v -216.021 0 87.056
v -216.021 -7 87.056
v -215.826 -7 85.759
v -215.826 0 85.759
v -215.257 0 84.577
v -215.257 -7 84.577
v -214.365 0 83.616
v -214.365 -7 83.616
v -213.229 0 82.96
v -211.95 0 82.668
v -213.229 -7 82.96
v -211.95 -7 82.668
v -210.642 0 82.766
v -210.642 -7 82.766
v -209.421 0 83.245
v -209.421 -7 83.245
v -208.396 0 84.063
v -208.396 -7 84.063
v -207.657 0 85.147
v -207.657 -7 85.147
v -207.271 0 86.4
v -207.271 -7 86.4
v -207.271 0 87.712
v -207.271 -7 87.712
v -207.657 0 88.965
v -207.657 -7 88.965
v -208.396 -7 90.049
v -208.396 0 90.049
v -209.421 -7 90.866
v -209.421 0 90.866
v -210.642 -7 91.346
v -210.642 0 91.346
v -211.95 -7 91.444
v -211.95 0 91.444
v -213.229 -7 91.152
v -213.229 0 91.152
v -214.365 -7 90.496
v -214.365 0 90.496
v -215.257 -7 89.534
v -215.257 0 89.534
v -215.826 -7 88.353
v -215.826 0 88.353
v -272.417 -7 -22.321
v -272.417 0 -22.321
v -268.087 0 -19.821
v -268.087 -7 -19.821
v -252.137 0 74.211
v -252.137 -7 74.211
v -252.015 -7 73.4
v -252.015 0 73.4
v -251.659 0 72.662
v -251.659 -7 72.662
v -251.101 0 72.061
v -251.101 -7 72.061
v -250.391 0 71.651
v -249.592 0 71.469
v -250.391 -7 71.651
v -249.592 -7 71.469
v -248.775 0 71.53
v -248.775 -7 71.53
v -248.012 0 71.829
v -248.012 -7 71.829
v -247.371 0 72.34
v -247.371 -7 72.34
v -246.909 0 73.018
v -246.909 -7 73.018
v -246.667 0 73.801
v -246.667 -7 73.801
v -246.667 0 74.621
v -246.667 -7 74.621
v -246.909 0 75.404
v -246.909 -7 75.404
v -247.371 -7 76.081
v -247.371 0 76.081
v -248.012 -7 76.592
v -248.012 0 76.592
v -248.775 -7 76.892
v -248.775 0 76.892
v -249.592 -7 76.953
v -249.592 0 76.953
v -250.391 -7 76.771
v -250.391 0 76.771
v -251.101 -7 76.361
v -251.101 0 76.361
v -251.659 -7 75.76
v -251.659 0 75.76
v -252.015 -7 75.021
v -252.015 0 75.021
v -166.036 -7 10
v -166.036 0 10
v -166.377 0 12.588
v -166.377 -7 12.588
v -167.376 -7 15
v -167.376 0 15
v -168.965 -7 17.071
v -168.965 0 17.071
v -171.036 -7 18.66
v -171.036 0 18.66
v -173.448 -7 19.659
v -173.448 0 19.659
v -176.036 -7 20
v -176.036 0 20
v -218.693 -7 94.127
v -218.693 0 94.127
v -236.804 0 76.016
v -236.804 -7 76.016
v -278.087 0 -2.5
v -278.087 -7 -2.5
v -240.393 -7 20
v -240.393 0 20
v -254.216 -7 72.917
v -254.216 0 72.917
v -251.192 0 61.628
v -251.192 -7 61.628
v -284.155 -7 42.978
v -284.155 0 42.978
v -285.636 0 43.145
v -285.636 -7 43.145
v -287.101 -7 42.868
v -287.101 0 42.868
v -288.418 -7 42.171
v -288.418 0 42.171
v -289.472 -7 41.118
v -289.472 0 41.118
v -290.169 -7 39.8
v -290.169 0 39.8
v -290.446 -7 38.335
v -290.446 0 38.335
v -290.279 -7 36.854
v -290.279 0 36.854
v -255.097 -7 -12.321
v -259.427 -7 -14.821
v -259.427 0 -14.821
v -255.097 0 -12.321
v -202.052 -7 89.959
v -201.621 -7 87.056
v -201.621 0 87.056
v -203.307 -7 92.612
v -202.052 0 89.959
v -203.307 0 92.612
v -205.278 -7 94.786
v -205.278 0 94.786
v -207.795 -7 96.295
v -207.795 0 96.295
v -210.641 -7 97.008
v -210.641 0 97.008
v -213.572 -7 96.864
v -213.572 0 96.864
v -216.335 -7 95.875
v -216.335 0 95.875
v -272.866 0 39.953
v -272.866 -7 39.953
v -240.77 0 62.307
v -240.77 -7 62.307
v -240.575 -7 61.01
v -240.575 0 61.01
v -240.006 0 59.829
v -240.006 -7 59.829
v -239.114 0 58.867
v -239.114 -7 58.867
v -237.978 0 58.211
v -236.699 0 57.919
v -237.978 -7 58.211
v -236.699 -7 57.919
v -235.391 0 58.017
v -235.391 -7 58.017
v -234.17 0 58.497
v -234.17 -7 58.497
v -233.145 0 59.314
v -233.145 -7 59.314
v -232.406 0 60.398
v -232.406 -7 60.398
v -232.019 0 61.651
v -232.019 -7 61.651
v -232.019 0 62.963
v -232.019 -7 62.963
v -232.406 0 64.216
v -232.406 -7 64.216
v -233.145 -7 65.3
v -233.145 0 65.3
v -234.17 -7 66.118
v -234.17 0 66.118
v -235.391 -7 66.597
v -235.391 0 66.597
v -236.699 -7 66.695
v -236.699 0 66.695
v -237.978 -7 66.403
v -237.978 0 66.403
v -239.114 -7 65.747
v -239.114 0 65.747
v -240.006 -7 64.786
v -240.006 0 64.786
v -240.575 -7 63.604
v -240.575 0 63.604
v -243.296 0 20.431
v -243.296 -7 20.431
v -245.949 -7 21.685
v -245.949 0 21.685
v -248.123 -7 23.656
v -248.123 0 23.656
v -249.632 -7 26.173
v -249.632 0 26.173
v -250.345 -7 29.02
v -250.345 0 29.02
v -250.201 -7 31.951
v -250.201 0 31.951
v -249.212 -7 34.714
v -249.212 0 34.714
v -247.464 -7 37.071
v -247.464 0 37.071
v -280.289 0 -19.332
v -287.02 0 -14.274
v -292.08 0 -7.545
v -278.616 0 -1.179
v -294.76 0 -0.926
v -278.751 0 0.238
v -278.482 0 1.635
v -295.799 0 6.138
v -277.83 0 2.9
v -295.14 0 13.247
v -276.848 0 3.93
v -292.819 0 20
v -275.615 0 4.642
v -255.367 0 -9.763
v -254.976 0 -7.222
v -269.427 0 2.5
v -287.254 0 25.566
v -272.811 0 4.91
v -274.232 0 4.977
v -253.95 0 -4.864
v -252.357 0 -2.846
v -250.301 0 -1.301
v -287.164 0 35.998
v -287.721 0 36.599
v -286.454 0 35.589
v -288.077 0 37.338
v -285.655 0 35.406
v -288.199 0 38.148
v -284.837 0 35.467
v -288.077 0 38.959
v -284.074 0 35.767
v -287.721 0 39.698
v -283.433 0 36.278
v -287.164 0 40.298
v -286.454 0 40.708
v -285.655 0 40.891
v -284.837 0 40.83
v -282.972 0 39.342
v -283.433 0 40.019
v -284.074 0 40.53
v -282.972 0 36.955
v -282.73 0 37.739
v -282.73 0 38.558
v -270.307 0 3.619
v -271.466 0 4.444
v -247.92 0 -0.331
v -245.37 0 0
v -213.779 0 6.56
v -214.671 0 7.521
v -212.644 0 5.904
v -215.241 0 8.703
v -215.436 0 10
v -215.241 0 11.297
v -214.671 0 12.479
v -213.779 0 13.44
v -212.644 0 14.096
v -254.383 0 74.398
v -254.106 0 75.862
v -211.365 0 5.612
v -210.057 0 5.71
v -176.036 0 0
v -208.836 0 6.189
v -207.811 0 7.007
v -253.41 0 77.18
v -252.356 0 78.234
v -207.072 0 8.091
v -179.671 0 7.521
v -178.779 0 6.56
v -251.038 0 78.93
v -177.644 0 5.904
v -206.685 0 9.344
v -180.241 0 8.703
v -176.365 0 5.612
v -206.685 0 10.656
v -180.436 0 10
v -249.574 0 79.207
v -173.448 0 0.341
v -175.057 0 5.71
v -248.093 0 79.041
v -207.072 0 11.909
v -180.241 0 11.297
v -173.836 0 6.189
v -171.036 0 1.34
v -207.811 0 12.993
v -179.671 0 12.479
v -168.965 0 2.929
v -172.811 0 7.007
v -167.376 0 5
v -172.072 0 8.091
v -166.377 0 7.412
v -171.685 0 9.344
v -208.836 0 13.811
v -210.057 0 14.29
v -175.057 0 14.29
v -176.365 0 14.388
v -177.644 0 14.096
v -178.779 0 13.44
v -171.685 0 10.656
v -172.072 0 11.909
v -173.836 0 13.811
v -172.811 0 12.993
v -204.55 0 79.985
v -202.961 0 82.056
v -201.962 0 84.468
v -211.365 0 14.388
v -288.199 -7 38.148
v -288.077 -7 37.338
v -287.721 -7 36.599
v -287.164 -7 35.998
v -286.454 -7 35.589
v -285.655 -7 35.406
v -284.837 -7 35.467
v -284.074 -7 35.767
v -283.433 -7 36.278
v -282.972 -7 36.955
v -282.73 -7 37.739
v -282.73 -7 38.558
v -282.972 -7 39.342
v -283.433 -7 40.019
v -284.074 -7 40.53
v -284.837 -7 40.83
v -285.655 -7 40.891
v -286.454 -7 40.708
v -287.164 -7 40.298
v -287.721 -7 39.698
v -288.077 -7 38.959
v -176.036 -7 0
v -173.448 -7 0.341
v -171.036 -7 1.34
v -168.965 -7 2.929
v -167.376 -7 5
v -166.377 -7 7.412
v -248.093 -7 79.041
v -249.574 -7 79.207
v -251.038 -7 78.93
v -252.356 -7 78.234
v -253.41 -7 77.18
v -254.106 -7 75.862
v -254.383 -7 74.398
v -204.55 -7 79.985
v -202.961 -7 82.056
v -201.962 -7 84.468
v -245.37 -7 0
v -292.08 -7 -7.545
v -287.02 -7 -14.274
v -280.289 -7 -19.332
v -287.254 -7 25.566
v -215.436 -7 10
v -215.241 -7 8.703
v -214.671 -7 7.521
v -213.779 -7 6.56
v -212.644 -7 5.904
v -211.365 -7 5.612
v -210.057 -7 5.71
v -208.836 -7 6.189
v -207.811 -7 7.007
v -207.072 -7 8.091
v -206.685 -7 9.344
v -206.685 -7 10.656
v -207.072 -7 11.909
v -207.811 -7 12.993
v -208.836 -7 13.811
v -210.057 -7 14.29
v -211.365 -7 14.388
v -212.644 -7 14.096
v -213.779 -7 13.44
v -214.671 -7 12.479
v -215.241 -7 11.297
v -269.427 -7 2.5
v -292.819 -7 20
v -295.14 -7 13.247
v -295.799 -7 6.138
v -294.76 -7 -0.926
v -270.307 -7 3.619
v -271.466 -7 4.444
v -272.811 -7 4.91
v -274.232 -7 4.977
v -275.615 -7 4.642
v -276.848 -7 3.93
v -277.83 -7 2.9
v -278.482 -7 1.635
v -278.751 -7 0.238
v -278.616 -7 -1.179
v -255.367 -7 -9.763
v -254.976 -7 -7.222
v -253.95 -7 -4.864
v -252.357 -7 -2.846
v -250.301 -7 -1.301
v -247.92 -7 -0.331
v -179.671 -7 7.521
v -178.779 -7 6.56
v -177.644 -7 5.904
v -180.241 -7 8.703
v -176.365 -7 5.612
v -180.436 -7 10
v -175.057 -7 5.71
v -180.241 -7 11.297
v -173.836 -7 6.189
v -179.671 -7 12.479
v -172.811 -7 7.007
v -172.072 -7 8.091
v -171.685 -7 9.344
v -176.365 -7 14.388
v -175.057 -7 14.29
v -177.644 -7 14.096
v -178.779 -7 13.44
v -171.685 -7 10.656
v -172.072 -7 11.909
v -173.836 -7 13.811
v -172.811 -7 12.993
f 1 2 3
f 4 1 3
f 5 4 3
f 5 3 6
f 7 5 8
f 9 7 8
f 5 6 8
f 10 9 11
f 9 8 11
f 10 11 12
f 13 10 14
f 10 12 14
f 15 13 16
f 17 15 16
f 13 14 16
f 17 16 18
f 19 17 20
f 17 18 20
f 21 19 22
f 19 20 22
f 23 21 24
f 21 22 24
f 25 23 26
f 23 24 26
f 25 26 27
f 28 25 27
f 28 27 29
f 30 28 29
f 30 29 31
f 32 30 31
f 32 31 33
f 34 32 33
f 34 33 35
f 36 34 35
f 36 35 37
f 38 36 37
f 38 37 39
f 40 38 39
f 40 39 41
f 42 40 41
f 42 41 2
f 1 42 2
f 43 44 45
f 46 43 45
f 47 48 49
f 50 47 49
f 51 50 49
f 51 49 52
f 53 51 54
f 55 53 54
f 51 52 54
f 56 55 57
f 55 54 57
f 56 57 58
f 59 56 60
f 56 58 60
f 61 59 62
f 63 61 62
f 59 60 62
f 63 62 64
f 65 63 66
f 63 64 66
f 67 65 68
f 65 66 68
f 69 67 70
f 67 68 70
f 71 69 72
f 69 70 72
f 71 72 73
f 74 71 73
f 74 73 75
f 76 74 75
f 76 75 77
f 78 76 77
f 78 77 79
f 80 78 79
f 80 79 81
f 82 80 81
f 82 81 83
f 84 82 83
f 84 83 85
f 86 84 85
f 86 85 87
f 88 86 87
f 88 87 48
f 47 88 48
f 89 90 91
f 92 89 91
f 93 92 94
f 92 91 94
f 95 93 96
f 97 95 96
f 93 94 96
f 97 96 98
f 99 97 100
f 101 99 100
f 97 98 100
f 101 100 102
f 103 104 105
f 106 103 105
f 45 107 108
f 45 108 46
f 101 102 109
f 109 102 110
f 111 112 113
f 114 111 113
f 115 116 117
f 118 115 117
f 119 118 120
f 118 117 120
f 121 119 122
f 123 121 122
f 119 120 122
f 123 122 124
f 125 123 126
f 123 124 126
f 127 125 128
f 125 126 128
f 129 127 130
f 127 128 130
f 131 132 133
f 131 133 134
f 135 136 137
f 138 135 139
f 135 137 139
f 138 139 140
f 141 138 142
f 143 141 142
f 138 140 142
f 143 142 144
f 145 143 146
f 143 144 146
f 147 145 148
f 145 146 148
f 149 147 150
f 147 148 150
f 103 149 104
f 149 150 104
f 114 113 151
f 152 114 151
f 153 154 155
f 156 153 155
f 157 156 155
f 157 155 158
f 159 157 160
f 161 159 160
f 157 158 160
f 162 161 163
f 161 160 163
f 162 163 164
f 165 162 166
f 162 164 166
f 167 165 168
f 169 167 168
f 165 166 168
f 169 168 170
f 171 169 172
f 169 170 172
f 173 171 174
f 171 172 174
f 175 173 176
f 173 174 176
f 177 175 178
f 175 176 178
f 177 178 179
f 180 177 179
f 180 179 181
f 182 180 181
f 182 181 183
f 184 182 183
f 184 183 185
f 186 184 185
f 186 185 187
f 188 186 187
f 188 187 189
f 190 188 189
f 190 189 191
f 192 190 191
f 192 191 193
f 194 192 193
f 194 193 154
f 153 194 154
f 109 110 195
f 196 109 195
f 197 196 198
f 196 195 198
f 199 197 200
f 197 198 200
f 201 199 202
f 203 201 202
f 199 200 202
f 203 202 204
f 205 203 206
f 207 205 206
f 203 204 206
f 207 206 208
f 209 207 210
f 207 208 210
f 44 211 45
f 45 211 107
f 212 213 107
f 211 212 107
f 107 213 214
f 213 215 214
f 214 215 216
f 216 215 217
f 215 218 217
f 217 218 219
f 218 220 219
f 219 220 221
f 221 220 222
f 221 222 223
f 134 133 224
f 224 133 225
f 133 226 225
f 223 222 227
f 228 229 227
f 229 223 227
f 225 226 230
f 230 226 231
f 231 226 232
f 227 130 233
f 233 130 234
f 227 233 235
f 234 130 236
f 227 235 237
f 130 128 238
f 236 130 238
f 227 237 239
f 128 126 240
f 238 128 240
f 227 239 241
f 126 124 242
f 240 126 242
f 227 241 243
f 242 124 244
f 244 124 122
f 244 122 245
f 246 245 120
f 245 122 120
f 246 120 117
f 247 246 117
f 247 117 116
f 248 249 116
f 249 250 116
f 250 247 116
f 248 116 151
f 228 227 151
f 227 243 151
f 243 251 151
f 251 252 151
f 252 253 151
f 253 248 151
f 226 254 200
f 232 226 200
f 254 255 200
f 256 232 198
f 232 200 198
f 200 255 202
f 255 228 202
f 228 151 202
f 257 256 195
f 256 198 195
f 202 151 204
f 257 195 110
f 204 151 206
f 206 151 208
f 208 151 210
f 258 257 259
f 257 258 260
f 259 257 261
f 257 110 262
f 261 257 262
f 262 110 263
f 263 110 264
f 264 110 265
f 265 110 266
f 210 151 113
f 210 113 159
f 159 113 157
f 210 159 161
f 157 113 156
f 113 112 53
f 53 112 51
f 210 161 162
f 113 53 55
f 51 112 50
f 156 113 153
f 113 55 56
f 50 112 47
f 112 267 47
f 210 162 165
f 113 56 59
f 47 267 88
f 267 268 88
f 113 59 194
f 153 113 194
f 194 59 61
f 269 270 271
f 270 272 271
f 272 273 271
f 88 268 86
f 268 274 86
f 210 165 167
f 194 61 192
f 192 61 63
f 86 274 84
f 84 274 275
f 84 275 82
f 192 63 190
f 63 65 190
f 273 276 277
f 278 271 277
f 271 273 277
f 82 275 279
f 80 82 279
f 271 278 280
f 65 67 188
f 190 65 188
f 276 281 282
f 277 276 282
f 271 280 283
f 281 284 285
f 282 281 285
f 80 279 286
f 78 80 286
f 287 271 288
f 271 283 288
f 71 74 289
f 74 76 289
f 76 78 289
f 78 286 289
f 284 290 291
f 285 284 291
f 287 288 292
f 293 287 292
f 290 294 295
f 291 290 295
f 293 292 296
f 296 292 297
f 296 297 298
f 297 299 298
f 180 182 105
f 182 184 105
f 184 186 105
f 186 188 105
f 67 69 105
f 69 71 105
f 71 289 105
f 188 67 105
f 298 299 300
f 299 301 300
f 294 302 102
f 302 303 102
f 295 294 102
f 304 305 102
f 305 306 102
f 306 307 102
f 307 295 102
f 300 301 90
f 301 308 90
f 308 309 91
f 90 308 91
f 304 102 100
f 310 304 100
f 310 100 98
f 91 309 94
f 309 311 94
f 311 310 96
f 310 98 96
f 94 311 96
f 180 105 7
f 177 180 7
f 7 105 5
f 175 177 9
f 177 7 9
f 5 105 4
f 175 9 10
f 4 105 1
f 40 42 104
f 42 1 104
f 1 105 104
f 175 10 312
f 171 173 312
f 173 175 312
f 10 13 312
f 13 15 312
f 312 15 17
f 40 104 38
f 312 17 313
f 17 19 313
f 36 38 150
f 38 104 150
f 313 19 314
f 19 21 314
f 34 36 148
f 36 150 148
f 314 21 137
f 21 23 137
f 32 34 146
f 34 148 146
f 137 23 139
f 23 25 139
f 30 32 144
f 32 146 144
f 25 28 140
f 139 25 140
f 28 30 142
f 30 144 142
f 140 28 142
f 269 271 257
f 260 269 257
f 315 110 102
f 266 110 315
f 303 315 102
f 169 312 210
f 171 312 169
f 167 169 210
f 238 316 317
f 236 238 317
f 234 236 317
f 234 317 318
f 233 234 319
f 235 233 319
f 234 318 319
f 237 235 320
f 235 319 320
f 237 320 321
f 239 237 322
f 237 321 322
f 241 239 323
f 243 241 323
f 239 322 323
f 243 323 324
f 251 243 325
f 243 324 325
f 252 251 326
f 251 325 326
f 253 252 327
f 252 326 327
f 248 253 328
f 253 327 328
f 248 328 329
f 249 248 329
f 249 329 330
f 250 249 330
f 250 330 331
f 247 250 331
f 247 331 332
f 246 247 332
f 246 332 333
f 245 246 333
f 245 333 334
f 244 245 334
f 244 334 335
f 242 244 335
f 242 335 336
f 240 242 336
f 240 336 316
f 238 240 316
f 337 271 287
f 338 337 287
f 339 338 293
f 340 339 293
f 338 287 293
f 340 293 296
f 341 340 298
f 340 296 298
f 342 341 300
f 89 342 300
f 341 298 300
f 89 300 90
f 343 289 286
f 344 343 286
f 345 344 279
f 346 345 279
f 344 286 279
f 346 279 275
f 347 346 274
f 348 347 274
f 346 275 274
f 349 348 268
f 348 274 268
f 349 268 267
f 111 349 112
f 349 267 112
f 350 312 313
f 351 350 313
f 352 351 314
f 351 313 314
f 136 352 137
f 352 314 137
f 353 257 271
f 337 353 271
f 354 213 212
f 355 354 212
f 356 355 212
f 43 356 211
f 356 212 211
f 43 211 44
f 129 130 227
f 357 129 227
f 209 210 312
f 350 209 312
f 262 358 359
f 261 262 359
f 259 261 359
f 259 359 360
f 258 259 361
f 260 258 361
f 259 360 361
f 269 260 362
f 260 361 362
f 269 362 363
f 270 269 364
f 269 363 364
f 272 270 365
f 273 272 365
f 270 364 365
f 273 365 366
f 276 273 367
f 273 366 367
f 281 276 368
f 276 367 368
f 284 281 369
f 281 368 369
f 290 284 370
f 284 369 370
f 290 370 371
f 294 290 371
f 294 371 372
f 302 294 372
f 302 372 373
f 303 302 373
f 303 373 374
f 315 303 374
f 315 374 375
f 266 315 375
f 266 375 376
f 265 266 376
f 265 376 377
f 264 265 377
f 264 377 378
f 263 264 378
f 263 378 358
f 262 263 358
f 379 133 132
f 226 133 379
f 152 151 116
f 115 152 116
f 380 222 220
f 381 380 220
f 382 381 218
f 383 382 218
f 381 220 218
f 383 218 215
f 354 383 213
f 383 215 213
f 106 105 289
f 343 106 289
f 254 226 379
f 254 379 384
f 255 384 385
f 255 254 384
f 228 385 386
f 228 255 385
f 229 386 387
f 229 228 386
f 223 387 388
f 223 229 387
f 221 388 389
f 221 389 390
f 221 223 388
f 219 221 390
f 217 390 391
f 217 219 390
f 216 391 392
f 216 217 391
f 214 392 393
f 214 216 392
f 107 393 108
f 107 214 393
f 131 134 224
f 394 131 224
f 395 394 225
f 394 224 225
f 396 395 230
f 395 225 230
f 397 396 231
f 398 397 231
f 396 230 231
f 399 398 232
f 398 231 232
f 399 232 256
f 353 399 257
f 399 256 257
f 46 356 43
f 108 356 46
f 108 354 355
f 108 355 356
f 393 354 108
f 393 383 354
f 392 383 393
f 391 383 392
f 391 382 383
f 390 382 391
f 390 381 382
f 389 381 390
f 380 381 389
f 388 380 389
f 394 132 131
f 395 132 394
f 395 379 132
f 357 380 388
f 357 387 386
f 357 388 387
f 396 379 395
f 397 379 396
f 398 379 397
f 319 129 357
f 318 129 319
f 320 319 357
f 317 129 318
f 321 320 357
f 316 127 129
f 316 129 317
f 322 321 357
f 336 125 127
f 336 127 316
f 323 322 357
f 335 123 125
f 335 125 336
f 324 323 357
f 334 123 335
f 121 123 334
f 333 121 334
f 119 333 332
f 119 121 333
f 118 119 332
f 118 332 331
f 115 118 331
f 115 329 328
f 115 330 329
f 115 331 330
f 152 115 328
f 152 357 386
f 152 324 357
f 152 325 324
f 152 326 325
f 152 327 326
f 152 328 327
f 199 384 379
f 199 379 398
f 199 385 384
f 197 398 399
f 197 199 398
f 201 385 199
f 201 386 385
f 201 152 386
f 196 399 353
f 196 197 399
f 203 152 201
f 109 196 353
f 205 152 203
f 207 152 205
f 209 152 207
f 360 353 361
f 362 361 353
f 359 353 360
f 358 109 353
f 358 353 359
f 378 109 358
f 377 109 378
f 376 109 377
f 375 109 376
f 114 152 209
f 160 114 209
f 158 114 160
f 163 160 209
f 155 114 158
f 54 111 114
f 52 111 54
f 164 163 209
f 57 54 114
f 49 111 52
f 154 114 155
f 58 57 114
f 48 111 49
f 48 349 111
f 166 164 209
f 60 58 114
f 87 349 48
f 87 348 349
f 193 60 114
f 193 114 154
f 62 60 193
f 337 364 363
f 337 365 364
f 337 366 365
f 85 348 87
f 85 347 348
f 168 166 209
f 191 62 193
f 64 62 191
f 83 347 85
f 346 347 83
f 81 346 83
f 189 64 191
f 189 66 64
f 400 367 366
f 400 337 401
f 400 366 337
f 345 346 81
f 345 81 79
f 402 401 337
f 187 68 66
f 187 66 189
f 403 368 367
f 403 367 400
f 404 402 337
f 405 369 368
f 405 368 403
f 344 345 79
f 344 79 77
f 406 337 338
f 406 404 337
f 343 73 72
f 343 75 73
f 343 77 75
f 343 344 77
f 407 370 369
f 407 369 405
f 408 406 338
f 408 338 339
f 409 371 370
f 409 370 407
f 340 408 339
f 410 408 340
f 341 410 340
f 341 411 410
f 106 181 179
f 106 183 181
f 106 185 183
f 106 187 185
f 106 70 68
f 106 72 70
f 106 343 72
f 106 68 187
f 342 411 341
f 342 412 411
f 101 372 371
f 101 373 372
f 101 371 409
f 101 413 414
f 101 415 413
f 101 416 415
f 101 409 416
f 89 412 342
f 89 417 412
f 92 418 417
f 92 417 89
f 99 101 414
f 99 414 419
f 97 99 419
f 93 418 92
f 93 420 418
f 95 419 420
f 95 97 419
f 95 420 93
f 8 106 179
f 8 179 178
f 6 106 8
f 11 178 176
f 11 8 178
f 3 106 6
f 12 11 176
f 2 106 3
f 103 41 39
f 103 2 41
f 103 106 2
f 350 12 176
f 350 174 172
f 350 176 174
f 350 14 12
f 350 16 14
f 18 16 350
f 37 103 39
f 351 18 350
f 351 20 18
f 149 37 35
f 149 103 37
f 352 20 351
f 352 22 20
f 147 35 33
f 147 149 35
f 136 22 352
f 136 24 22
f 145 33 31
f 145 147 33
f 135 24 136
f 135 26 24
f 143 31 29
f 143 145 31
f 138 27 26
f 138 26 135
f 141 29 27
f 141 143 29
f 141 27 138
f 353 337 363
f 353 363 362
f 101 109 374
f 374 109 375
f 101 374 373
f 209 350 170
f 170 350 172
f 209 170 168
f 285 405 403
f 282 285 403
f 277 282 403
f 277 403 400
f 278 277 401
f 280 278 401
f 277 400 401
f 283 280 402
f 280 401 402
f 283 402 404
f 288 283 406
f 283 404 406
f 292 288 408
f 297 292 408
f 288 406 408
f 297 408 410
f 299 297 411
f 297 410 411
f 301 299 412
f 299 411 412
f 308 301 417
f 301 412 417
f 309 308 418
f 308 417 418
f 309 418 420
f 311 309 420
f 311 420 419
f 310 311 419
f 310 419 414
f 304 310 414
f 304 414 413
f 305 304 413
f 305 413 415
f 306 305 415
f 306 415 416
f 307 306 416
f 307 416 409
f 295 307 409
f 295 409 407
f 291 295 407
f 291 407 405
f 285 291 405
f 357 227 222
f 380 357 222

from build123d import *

# Parameters (mm, degrees)
F2_DEPTH = 7
F3_DEPTH = 7
F4_D     = 5.5
F5_D     = 8.8


with BuildPart() as f2:
    # F1 (on Front) → F2 (new body)
    with BuildSketch(Plane.XZ):
        with BuildLine():
            ThreePointArc((-176.0360002518, 0), (-168.9649324399, 2.9289321881), (-166.0360002518, 10))
            ThreePointArc((-166.0360002518, 10), (-168.9649324399, 17.0710678119), (-176.0360002518, 20))
            ThreePointArc((-176.0360002518, 20), (-186.0360002518, 10), (-176.0360002518, 0))
        make_face()
        with BuildLine():
            Line((-264.5352196047, 20), (-240.393083981, 20))
            ThreePointArc((-240.393083981, 20), (-249.6318793158, 26.1731656999), (-247.4641517568, 37.0710678479))
            Line((-247.4641517568, 37.0710678479), (-264.5352196047, 20))
        make_face()
        with BuildLine():
            Line((-272.4173313033, -22.3205080757), (-255.0968232276, -12.3205080757))
            ThreePointArc((-255.0968232276, -12.3205080757), (-261.1688868565, -7.6612498015), (-268.757077341, -8.6602540815))
            ThreePointArc((-268.757077341, -8.6602540815), (-273.4163355396, -14.7323176668), (-272.4173313033, -22.3205080757))
        make_face()
        with BuildLine():
            Line((-255.0968232276, -12.3205080757), (-262.2100718816, 0))
            Line((-262.2100718816, 0), (-263.7570772654, 0))
            ThreePointArc((-263.7570772654, 0), (-265.0968232494, -5.0000000378), (-268.757077341, -8.6602540815))
            ThreePointArc((-268.757077341, -8.6602540815), (-261.1688868565, -7.6612498015), (-255.0968232276, -12.3205080757))
        make_face()
        with BuildLine():
            ThreePointArc((-272.4173313033, -22.3205080757), (-273.4163355396, -14.7323176668), (-268.757077341, -8.6602540815))
            ThreePointArc((-268.757077341, -8.6602540815), (-276.3452678591, -9.6592582247), (-282.4173314074, -4.9999998197))
            Line((-282.4173314074, -4.9999998197), (-272.4173313033, -22.3205080757))
        make_face()
        with BuildLine():
            ThreePointArc((-265.0968232276, 5), (-269.1126993205, 8.856057447), (-274.5681672284, 9.9670523763))
            Line((-274.5681672284, 9.9670523763), (-283.7241296417, 0.811089963))
            ThreePointArc((-283.7241296417, 0.811089963), (-283.5134253602, -2.1940081707), (-282.4173314074, -4.9999998197))
            ThreePointArc((-282.4173314074, -4.9999998197), (-276.3452678591, -9.6592582247), (-268.757077341, -8.6602540815))
            ThreePointArc((-268.757077341, -8.6602540815), (-265.0968232494, -5.0000000378), (-263.7570772654, 0))
            ThreePointArc((-263.7570772654, 0), (-264.0978190025, 2.588190451), (-265.0968232276, 5))
        make_face()
        with BuildLine():
            Line((-263.7570772654, 0), (-262.2100718816, 0))
            Line((-262.2100718816, 0), (-265.0968232276, 5))
            ThreePointArc((-265.0968232276, 5), (-264.0978190025, 2.588190451), (-263.7570772654, 0))
        make_face()
        with BuildLine():
            ThreePointArc((-176.0360002518, 0), (-186.0360002518, 10), (-176.0360002518, 20))
            Line((-176.0360002518, 20), (-240.393083981, 20))
            Line((-240.393083981, 20), (-264.5352196047, 20))
            Line((-264.5352196047, 20), (-274.5681672284, 9.9670523763))
            ThreePointArc((-274.5681672284, 9.9670523763), (-269.1126993205, 8.856057447), (-265.0968232276, 5))
            Line((-265.0968232276, 5), (-262.2100718816, 0))
            Line((-262.2100718816, 0), (-245.3697865632, 0))
            Line((-245.3697865632, 0), (-176.0360002518, 0))
        make_face()
        with BuildLine():
            Line((-283.7241296417, 0.811089963), (-274.5681672284, 9.9670523763))
            ThreePointArc((-274.5681672284, 9.9670523763), (-280.8281450773, 7.0710678119), (-283.7241296417, 0.811089963))
        make_face()
        with BuildLine():
            ThreePointArc((-282.4173314074, -4.9999998197), (-283.5134253602, -2.1940081707), (-283.7241296417, 0.811089963))
            Line((-283.7241296417, 0.811089963), (-285.0226592429, -0.4874396382))
            Line((-285.0226592429, -0.4874396382), (-282.4173314074, -4.9999998197))
        make_face()
        with BuildLine():
            Line((-274.5681672284, 9.9670523763), (-264.5352196047, 20))
            Line((-264.5352196047, 20), (-292.8194908522, 20))
            ThreePointArc((-292.8194908522, 20), (-295.7992302368, 6.1376963428), (-292.0799732137, -7.544753609))
            Line((-292.0799732137, -7.544753609), (-285.0226592429, -0.4874396382))
            Line((-285.0226592429, -0.4874396382), (-283.7241296417, 0.811089963))
            ThreePointArc((-283.7241296417, 0.811089963), (-280.8281450773, 7.0710678119), (-274.5681672284, 9.9670523763))
        make_face()
        with BuildLine():
            ThreePointArc((-292.0799732137, -7.544753609), (-283.8324896653, -17.0403017463), (-272.4173313033, -22.3205080757))
            Line((-272.4173313033, -22.3205080757), (-282.4173314074, -4.9999998197))
            Line((-282.4173314074, -4.9999998197), (-285.0226592429, -0.4874396382))
            Line((-285.0226592429, -0.4874396382), (-292.0799732137, -7.544753609))
        make_face()
        with BuildLine():
            Line((-292.8194908522, 20), (-264.5352196047, 20))
            Line((-264.5352196047, 20), (-247.4641517568, 37.0710678479))
            Line((-247.4641517568, 37.0710678479), (-204.550425378, 79.9847942268))
            ThreePointArc((-204.550425378, 79.9847942268), (-218.6925610017, 79.9847942268), (-218.6925610017, 94.1269298505))
            Line((-218.6925610017, 94.1269298505), (-236.8037936181, 76.015697234))
            Line((-236.8037936181, 76.015697234), (-251.1915228084, 61.6279680438))
            Line((-251.1915228084, 61.6279680438), (-272.8662394587, 39.9532513935))
            Line((-272.8662394587, 39.9532513935), (-287.2539686489, 25.5655222033))
            Line((-287.2539686489, 25.5655222033), (-292.8194908522, 20))
        make_face()
        with BuildLine():
            Line((-290.2788043549, 36.8543627425), (-287.2539686489, 25.5655222033))
            Line((-287.2539686489, 25.5655222033), (-272.8662394587, 39.9532513935))
            Line((-272.8662394587, 39.9532513935), (-284.1550799979, 42.9780870995))
            ThreePointArc((-284.1550799979, 42.9780870995), (-281.482408522, 41.1922651131), (-280.4491752234, 38.1484579681))
            ThreePointArc((-280.4491752234, 38.1484579681), (-284.7965442623, 33.1912336612), (-290.2788043549, 36.8543627425))
        make_face()
        with BuildLine():
            ThreePointArc((-284.1550799979, 42.9780870995), (-288.9847091293, 41.683991874), (-290.2788043549, 36.8543627425))
            ThreePointArc((-290.2788043549, 36.8543627425), (-284.7965442623, 33.1912336612), (-280.4491752234, 38.1484579681))
            ThreePointArc((-280.4491752234, 38.1484579681), (-281.482408522, 41.1922651131), (-284.1550799979, 42.9780870995))
        make_face()
        with BuildLine():
            Line((-251.1915228084, 61.6279680438), (-236.8037936181, 76.015697234))
            Line((-236.8037936181, 76.015697234), (-248.0926341574, 79.04053294))
            ThreePointArc((-248.0926341574, 79.04053294), (-245.4199626814, 77.2547109536), (-244.3867293829, 74.2109038086))
            ThreePointArc((-244.3867293829, 74.2109038086), (-248.7340984218, 69.2536795017), (-254.2163585143, 72.9168085831))
            Line((-254.2163585143, 72.9168085831), (-251.1915228084, 61.6279680438))
        make_face()
        with BuildLine():
            ThreePointArc((-244.3867293829, 74.2109038086), (-245.4199626814, 77.2547109536), (-248.0926341574, 79.04053294))
            ThreePointArc((-248.0926341574, 79.04053294), (-252.9222632888, 77.7464377145), (-254.2163585143, 72.9168085831))
            ThreePointArc((-254.2163585143, 72.9168085831), (-248.7340984218, 69.2536795017), (-244.3867293829, 74.2109038086))
        make_face()
        with BuildLine():
            ThreePointArc((-218.6925610017, 94.1269298505), (-218.6925610017, 79.9847942268), (-204.550425378, 79.9847942268))
            ThreePointArc((-204.550425378, 79.9847942268), (-202.3826978647, 83.229027715), (-201.6214931898, 87.0558620386))
            ThreePointArc((-201.6214931898, 87.0558620386), (-207.7946588662, 96.2946573637), (-218.6925610017, 94.1269298505))
        make_face()
        with BuildLine():
            ThreePointArc((-255.0968232276, -12.3205080757), (-253.2185151467, -3.8034316254), (-245.3697865632, 0))
            Line((-245.3697865632, 0), (-262.2100718816, 0))
            Line((-262.2100718816, 0), (-255.0968232276, -12.3205080757))
        make_face()
    extrude(amount=F2_DEPTH)

    # F0 (on Front) → F3 (cut, through all)
    with BuildSketch(Plane.XZ):
        with BuildLine():
            ThreePointArc((-278.0872042843, -2.5), (-272.4629820399, -4.8296291314), (-268.7570772654, 0))
            ThreePointArc((-268.7570772654, 0), (-268.927448134, 1.2940952255), (-269.4269502465, 2.5))
            ThreePointArc((-269.4269502465, 2.5), (-276.2570772654, 4.3301270189), (-278.0872042843, -2.5))
        make_face()
        with BuildLine():
            ThreePointArc((-269.4269502465, 2.5), (-268.927448134, 1.2940952255), (-268.7570772654, 0))
            ThreePointArc((-268.7570772654, 0), (-272.4629820399, -4.8296291314), (-278.0872042843, -2.5))
            Line((-278.0872042843, -2.5), (-268.0872042843, -19.8205080757))
            ThreePointArc((-268.0872042843, -19.8205080757), (-266.2570772654, -12.9903810568), (-259.4269502465, -14.8205080757))
            Line((-259.4269502465, -14.8205080757), (-269.4269502465, 2.5))
        make_face()
        with BuildLine():
            ThreePointArc((-258.7570772654, -17.3205080757), (-258.927448134, -16.0264128502), (-259.4269502465, -14.8205080757))
            ThreePointArc((-259.4269502465, -14.8205080757), (-266.2570772654, -12.9903810568), (-268.0872042843, -19.8205080757))
            ThreePointArc((-268.0872042843, -19.8205080757), (-262.4629820399, -22.1501372071), (-258.7570772654, -17.3205080757))
        make_face()
    extrude(amount=F3_DEPTH, mode=Mode.SUBTRACT)

    # F4 (through all)
    with Locations(Plane(origin=(0, 0, 0), x_dir=(1, 0, 0), z_dir=(0, 1, 0))):
        with Locations((-249.3867293829, -74.2109038086), (-285.4491752234, -38.1484579681)):
            Hole(F4_D / 2)

    # F5 (through all)
    with Locations(Plane(origin=(0, 0, 0), x_dir=(1, 0, 0), z_dir=(0, 1, 0))):
        with Locations((-176.0360002518, -10), (-211.6214931898, -87.0558620386), (-236.3702305314, -62.3071246971), (-211.0360002518, -10)):
            Hole(F5_D / 2)


solid = f2.part
